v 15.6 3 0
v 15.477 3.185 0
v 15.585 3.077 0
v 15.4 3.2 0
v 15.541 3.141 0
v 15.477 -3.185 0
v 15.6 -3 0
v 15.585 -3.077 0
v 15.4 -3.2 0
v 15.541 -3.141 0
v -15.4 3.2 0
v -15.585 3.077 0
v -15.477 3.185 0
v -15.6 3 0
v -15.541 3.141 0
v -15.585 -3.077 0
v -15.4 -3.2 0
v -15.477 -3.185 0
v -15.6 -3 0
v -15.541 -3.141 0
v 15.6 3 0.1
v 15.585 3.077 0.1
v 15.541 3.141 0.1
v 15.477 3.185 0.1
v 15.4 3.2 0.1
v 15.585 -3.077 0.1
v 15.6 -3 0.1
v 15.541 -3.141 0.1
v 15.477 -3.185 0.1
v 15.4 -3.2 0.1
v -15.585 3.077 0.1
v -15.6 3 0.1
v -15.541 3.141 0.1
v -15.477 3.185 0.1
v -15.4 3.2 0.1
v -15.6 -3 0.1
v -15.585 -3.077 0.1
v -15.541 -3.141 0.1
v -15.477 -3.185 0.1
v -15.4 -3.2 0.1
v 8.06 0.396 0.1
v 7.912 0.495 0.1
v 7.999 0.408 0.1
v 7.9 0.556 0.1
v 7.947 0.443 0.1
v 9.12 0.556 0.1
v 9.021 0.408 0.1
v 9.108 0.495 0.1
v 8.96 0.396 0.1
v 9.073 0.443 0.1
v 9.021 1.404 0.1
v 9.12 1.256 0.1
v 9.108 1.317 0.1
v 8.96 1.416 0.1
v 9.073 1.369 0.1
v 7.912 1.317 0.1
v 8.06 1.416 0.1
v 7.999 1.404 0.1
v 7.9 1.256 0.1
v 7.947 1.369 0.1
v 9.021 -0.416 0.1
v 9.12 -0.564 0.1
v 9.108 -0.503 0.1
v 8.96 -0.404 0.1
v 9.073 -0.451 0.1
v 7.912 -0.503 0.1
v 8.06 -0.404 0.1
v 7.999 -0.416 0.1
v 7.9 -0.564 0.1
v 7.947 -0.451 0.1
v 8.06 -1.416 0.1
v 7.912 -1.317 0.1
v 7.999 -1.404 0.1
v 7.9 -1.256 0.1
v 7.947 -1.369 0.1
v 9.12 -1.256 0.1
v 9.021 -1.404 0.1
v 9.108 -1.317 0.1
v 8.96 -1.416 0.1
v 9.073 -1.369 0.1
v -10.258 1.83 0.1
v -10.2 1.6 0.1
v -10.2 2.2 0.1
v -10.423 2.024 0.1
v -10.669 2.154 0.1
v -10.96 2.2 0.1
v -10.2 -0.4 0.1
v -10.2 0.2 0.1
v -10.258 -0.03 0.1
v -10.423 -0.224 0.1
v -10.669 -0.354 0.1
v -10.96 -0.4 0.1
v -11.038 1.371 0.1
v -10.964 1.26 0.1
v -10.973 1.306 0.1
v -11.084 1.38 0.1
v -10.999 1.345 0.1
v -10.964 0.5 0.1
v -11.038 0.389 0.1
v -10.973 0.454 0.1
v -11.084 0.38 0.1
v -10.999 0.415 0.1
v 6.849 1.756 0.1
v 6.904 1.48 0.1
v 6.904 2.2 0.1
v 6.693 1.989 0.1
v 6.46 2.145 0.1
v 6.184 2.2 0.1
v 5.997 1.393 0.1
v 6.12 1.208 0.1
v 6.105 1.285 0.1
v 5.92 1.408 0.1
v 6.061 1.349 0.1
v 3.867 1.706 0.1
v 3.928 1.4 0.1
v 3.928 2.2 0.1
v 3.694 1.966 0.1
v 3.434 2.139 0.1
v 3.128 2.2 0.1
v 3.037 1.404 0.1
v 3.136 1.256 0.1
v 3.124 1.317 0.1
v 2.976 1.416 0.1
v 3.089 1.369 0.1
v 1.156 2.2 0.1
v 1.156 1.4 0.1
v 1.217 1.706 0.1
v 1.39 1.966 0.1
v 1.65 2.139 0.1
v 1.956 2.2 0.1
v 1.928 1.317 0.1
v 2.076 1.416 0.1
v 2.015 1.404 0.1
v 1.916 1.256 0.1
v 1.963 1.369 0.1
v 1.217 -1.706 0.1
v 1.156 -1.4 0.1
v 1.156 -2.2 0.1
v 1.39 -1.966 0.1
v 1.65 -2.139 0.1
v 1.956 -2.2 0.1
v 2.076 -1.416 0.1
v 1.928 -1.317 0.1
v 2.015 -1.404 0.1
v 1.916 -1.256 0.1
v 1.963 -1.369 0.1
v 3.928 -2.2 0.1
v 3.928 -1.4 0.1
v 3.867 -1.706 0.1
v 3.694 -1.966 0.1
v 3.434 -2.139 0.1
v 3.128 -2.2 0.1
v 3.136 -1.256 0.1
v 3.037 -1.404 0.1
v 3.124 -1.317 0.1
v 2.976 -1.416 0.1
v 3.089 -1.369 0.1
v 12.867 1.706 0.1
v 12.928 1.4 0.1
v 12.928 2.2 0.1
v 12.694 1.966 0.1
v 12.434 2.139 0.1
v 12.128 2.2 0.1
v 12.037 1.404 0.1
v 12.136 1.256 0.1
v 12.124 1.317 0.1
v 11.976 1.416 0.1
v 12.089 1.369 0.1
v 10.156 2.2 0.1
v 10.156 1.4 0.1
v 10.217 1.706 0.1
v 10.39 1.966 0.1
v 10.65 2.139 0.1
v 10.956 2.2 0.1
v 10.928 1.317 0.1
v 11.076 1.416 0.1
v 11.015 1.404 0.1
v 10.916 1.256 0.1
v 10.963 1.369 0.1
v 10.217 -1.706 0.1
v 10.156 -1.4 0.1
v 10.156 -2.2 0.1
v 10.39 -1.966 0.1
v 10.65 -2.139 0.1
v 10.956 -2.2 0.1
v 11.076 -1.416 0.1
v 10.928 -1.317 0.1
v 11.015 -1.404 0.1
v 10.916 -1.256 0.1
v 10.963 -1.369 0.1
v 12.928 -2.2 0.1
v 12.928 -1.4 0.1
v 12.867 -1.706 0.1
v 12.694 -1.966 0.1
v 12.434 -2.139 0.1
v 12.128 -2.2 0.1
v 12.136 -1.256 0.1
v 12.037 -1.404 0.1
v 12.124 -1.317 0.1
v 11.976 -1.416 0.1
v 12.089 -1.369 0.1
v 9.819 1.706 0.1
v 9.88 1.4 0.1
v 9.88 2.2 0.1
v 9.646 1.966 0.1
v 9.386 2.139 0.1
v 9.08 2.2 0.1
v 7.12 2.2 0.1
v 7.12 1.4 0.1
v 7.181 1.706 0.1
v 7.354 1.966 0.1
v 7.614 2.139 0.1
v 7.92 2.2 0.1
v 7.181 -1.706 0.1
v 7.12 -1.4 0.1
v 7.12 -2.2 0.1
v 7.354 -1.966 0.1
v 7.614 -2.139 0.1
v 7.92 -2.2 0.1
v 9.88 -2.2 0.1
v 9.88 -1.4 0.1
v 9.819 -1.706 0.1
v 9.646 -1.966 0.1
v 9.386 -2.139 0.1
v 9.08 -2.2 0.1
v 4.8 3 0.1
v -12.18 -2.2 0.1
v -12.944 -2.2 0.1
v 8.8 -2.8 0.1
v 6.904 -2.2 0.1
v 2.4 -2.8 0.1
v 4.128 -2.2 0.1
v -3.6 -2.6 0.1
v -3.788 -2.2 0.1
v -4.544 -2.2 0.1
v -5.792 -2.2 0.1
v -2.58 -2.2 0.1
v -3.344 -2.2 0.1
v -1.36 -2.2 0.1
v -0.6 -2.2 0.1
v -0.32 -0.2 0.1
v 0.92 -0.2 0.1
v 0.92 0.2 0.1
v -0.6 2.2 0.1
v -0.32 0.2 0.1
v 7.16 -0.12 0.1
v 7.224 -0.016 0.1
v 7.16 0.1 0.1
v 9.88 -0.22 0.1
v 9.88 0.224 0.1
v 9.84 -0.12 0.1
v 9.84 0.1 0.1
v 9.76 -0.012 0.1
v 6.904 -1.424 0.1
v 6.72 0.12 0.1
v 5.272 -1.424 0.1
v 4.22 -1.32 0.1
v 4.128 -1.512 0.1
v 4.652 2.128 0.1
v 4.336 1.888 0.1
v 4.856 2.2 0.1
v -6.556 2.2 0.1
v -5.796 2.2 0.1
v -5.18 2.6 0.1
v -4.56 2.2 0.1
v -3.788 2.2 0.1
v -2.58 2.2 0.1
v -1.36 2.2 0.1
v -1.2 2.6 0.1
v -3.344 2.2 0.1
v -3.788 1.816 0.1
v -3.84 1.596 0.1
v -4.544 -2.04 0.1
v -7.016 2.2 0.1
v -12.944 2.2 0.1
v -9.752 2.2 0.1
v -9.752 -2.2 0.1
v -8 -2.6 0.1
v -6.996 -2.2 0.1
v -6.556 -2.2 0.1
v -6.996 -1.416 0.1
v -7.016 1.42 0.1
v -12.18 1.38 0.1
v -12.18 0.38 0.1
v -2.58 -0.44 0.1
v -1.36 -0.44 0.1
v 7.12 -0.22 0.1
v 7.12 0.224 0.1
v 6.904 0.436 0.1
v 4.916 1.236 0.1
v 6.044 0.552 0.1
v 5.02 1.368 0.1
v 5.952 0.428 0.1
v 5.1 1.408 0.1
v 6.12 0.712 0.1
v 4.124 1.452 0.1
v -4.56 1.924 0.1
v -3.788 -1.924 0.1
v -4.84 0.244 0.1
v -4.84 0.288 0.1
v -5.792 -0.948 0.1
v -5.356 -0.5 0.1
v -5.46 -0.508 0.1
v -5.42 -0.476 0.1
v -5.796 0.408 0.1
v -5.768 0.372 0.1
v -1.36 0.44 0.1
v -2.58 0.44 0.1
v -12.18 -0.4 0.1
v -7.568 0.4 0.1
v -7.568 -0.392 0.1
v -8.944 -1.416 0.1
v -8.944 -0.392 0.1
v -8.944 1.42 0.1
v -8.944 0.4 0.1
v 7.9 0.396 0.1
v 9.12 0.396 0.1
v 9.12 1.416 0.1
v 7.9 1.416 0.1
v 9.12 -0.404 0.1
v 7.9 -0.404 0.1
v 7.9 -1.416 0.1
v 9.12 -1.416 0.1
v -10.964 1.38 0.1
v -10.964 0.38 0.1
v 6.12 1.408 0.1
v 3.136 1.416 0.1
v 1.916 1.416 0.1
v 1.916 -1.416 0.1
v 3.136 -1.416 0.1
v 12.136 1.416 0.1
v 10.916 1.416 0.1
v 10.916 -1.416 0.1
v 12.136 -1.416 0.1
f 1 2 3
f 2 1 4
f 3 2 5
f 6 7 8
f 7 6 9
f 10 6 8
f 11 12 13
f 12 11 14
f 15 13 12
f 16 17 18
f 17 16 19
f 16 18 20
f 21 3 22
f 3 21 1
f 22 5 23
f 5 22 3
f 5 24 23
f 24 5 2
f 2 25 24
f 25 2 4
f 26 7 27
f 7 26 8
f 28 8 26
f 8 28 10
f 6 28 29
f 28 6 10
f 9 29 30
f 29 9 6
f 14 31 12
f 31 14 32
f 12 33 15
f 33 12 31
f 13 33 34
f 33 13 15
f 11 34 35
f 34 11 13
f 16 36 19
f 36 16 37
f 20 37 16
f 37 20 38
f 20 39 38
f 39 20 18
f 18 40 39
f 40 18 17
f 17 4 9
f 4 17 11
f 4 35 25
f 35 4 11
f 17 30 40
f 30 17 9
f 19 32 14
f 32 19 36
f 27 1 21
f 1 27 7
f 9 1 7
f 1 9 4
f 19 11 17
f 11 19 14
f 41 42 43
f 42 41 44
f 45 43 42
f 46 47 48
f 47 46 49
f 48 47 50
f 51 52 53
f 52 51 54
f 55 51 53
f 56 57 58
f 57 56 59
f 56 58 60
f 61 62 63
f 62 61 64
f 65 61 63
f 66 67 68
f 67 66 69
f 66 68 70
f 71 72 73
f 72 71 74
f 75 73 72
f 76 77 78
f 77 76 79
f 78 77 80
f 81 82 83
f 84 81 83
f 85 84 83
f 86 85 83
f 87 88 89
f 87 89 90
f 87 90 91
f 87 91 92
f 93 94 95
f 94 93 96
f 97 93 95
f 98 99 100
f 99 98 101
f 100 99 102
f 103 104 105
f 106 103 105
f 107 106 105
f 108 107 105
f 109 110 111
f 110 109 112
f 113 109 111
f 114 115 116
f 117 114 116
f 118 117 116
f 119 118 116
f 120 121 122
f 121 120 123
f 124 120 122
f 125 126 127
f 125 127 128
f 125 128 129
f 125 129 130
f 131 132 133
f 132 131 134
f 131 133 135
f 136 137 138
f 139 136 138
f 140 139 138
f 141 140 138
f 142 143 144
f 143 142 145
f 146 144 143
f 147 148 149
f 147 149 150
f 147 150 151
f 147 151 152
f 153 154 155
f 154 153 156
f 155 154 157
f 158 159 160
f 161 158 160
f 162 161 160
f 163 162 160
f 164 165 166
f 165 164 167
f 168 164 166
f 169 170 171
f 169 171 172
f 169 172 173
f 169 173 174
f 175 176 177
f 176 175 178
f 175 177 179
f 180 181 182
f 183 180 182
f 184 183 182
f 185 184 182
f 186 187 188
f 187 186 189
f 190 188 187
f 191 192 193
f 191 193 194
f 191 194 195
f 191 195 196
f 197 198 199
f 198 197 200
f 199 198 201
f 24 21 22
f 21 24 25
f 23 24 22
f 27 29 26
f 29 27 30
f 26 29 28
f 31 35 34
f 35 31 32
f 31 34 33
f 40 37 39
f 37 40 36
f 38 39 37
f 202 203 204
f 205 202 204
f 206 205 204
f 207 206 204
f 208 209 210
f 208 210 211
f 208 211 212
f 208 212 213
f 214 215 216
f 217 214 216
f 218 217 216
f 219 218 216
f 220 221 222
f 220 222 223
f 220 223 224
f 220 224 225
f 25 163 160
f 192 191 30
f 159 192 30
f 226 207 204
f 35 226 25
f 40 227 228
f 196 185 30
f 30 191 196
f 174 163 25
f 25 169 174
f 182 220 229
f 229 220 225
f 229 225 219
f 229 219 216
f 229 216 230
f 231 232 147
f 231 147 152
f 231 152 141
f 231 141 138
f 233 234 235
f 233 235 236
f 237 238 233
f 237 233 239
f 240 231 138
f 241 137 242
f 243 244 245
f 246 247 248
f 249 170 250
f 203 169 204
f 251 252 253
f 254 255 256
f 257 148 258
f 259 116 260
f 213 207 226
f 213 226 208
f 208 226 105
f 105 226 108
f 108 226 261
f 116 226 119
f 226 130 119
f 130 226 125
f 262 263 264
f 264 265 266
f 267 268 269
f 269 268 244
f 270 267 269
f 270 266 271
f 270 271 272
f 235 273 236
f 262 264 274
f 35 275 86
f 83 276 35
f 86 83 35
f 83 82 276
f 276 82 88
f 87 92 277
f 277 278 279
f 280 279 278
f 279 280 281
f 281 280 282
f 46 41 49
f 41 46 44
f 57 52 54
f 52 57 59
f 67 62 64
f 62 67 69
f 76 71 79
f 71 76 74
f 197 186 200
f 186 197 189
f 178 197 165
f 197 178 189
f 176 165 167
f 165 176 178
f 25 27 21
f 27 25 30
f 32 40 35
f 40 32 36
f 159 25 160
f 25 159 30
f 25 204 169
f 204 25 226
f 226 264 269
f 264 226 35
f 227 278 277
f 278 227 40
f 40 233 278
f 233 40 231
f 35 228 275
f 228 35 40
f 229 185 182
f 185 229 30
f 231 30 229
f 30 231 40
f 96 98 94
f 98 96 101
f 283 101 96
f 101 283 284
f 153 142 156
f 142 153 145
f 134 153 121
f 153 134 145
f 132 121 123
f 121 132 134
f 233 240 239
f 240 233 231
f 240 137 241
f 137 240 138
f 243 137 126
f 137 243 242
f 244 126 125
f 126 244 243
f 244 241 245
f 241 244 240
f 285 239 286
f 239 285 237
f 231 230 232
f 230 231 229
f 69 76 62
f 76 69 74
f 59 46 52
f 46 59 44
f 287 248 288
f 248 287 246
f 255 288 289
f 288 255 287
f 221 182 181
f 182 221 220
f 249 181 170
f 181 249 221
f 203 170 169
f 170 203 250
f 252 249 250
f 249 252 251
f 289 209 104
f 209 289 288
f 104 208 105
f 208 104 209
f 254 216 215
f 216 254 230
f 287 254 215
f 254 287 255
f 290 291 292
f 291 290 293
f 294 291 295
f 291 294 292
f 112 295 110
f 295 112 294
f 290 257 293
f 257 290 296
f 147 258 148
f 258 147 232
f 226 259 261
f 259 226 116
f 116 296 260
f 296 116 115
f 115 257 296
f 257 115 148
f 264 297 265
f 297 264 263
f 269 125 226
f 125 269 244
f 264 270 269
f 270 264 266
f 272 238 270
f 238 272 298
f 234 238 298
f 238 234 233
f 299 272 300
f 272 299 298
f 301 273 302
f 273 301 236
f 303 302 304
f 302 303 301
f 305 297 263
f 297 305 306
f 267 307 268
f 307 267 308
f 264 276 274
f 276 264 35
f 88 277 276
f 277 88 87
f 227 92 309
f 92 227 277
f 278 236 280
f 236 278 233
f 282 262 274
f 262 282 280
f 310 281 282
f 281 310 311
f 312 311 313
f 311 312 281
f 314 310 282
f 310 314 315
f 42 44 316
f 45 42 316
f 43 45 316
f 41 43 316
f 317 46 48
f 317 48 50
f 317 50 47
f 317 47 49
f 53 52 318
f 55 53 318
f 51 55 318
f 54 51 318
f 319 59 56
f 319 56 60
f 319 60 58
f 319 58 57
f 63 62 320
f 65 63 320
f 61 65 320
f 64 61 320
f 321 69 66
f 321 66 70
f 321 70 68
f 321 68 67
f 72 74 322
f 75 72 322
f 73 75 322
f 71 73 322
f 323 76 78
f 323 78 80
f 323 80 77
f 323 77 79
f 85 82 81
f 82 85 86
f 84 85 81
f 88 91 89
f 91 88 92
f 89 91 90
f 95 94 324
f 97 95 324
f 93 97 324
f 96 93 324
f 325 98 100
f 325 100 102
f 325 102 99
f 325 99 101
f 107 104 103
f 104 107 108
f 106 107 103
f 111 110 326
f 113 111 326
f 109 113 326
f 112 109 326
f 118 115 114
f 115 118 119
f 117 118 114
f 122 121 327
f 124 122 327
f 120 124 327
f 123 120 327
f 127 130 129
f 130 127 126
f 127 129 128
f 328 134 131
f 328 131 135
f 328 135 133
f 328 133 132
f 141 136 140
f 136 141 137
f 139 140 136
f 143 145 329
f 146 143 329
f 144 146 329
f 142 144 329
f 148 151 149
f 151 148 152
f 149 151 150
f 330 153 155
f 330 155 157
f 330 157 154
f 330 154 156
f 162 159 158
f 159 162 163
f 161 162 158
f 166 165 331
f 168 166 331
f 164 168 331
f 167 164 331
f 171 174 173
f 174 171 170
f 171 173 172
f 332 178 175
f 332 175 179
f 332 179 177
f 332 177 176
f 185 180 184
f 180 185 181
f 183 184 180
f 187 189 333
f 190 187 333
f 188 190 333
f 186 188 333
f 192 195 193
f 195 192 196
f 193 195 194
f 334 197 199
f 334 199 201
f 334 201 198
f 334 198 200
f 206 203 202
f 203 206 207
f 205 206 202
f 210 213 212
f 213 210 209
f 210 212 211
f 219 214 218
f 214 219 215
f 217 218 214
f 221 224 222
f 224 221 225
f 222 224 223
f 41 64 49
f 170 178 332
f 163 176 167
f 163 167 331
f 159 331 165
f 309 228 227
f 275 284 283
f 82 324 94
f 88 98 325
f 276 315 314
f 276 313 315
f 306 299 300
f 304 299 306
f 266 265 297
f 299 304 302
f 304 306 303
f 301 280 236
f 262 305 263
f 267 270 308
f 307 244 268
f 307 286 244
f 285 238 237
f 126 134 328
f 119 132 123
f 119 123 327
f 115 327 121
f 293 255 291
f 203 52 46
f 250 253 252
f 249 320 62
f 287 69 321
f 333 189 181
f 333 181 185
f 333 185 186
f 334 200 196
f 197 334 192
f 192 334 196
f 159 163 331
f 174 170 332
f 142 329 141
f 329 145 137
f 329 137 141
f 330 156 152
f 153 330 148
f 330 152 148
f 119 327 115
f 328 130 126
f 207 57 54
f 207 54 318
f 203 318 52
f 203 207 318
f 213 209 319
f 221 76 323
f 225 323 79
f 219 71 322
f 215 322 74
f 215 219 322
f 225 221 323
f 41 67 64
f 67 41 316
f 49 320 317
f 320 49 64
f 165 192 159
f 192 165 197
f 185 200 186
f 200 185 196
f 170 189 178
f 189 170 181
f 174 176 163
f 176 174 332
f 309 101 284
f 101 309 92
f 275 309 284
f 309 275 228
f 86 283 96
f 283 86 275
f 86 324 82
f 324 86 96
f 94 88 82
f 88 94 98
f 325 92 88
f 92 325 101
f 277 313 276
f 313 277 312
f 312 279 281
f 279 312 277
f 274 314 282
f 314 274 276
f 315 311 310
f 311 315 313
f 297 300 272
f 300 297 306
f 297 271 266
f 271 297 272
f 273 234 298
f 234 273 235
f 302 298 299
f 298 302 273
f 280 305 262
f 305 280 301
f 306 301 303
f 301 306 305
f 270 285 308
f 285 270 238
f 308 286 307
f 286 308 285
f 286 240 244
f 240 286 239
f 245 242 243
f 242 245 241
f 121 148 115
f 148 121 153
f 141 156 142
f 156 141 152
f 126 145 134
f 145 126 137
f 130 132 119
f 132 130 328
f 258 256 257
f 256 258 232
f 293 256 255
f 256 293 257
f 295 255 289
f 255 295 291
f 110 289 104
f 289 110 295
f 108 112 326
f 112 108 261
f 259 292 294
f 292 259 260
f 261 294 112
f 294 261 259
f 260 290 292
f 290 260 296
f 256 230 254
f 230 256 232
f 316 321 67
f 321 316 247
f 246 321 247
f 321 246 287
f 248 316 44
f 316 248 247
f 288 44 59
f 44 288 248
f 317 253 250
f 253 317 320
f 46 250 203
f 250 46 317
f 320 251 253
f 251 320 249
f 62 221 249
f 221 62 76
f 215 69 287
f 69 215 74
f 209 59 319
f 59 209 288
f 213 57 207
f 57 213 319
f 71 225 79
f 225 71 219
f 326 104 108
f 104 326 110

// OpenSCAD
// file: ../p/1-4ndis.scad
use <../lib.scad>
function ldraw_lib__1_4ndis() = [
// 0 Disc Negative 0.25
// 0 Name: 1-4ndis.dat
// 0 Author: James Jessiman
// 0 !LDRAW_ORG Primitive UPDATE 2012-01
// 0 !LICENSE Licensed under CC BY 2.0 and CC BY 4.0 : see CAreadme.txt
// 
// 0 BFC CERTIFY CCW
  [0,"BFC","CERTIFY"],
  [0,"BFC","CCW"],
// 
// 0 !HISTORY 2002-03-23 [sbliss] Added BFC Statement
// 0 !HISTORY 2002-04-25 [PTadmin] Official Update 2002-02
// 0 !HISTORY 2007-06-22 [PTadmin] Header formatted for Contributor Agreement
// 0 !HISTORY 2008-07-01 [PTadmin] Official Update 2008-01
// 0 !HISTORY 2012-02-16 [Philo] Changed to CCW
// 0 !HISTORY 2012-03-30 [PTadmin] Official Update 2012-01
// 
// 
// 3 16 0.9239 0 0.3827 1 0 0 1 0 1
  [3,16,0.9239,0,0.3827,1,0,0,1,0,1],
// 3 16 0.7071 0 0.7071 0.9239 0 0.3827 1 0 1
  [3,16,0.7071,0,0.7071,0.9239,0,0.3827,1,0,1],
// 3 16 0.3827 0 0.9239 0.7071 0 0.7071 1 0 1
  [3,16,0.3827,0,0.9239,0.7071,0,0.7071,1,0,1],
// 3 16 0 0 1 0.3827 0 0.9239 1 0 1
  [3,16,0,0,1,0.3827,0,0.9239,1,0,1],
];
makepoly(ldraw_lib__1_4ndis(), line=0.2);
// file: ../p/box3u12.scad
use <../lib.scad>
function ldraw_lib__box3u12() = [
// 0 Box with 3 Parallel Faces without Any Edges
// 0 Name: box3u12.dat
// 0 Author: J.C. Tchang [tchang]
// 0 !LDRAW_ORG Primitive UPDATE 2014-02
// 0 !LICENSE Licensed under CC BY 2.0 and CC BY 4.0 : see CAreadme.txt
// 
// 0 BFC CERTIFY CCW
  [0,"BFC","CERTIFY"],
  [0,"BFC","CCW"],
// 
// 0 !HISTORY 2014-12-23 [PTadmin] Official Update 2014-02
// 
// 
// 4 16 -1 1 1 1 1 1 1 1 -1 -1 1 -1
  [4,16,-1,1,1,1,1,1,1,1,-1,-1,1,-1],
// 4 16 -1 1 1 -1 0 1 1 0 1 1 1 1
  [4,16,-1,1,1,-1,0,1,1,0,1,1,1,1],
// 4 16 1 1 -1 1 0 -1 -1 0 -1 -1 1 -1
  [4,16,1,1,-1,1,0,-1,-1,0,-1,-1,1,-1],
];
makepoly(ldraw_lib__box3u12(), line=0.2);
// file: ../p/1-4cyli.scad
use <../lib.scad>
function ldraw_lib__1_4cyli() = [
// 0 Cylinder 0.25
// 0 Name: 1-4cyli.dat
// 0 Author: James Jessiman
// 0 !LDRAW_ORG Primitive UPDATE 2012-01
// 0 !LICENSE Licensed under CC BY 2.0 and CC BY 4.0 : see CAreadme.txt
// 
// 0 BFC CERTIFY CCW
  [0,"BFC","CERTIFY"],
  [0,"BFC","CCW"],
// 
// 0 !HISTORY 2002-03-23 [sbliss] Added BFC statement.
// 0 !HISTORY 2002-04-25 [PTadmin] Official Update 2002-02
// 0 !HISTORY 2007-06-22 [PTadmin] Header formatted for Contributor Agreement
// 0 !HISTORY 2008-07-01 [PTadmin] Official Update 2008-01
// 0 !HISTORY 2012-02-16 [Philo] Changed to CCW
// 0 !HISTORY 2012-03-30 [PTadmin] Official Update 2012-01
// 
// 
// 4 16 1 1 0 0.9239 1 0.3827 0.9239 0 0.3827 1 0 0
  [4,16,1,1,0,0.9239,1,0.3827,0.9239,0,0.3827,1,0,0],
// 5 24 1 0 0 1 1 0 0.9239 0 0.3827 1 0 -1
  [5,24,1,0,0,1,1,0,0.9239,0,0.3827,1,0,-1],
// 4 16 0.9239 1 0.3827 0.7071 1 0.7071 0.7071 0 0.7071 0.9239 0 0.3827
  [4,16,0.9239,1,0.3827,0.7071,1,0.7071,0.7071,0,0.7071,0.9239,0,0.3827],
// 5 24 0.9239 0 0.3827 0.9239 1 0.3827 0.7071 0 0.7071 1 0 0
  [5,24,0.9239,0,0.3827,0.9239,1,0.3827,0.7071,0,0.7071,1,0,0],
// 4 16 0.7071 1 0.7071 0.3827 1 0.9239 0.3827 0 0.9239 0.7071 0 0.7071
  [4,16,0.7071,1,0.7071,0.3827,1,0.9239,0.3827,0,0.9239,0.7071,0,0.7071],
// 5 24 0.7071 0 0.7071 0.7071 1 0.7071 0.3827 0 0.9239 0.9239 0 0.3827
  [5,24,0.7071,0,0.7071,0.7071,1,0.7071,0.3827,0,0.9239,0.9239,0,0.3827],
// 4 16 0.3827 1 0.9239 0 1 1 0 0 1 0.3827 0 0.9239
  [4,16,0.3827,1,0.9239,0,1,1,0,0,1,0.3827,0,0.9239],
// 5 24 0.3827 0 0.9239 0.3827 1 0.9239 0 0 1 0.7071 0 0.7071
  [5,24,0.3827,0,0.9239,0.3827,1,0.9239,0,0,1,0.7071,0,0.7071],
// 5 24 0 0 1 0 1 1 0.3827 0 0.9239 -1 0 1
  [5,24,0,0,1,0,1,1,0.3827,0,0.9239,-1,0,1],
];
makepoly(ldraw_lib__1_4cyli(), line=0.2);
// file: ../p/1-4chrd.scad
use <../lib.scad>
function ldraw_lib__1_4chrd() = [
// 0 Chord 0.25
// 0 Name: 1-4chrd.dat
// 0 Author: Tony Hafner [hafhead]
// 0 !LDRAW_ORG Primitive UPDATE 2012-02
// 0 !LICENSE Licensed under CC BY 2.0 and CC BY 4.0 : see CAreadme.txt
// 
// 0 BFC CERTIFY CCW
  [0,"BFC","CERTIFY"],
  [0,"BFC","CCW"],
// 
// 0 !HISTORY 2004-04-22 [PTadmin] Official Update 2004-02
// 0 !HISTORY 2007-10-09 [PTadmin] Header formatted for Contributor Agreement
// 0 !HISTORY 2008-07-01 [PTadmin] Official Update 2008-01
// 0 !HISTORY 2012-08-02 [MMR1988] Re-creation with PrimGen2 and Rectifier
// 0 !HISTORY 2012-08-09 [PTadmin] Official Update 2012-02
// 
// 
// 4 16 0.9239 0 0.3827 0.3827 0 0.9239 0 0 1 1 0 0
  [4,16,0.9239,0,0.3827,0.3827,0,0.9239,0,0,1,1,0,0],
// 3 16 0.7071 0 0.7071 0.3827 0 0.9239 0.9239 0 0.3827
  [3,16,0.7071,0,0.7071,0.3827,0,0.9239,0.9239,0,0.3827],
];
makepoly(ldraw_lib__1_4chrd(), line=0.2);
// main file
use <../lib.scad>
use <../p/1-4chrd.scad>
use <../p/1-4cyli.scad>
use <../p/box3u12.scad>
use <s/6258203js01.scad>
function ldraw_lib__6258203j() = [
// 0 Sticker  0.8 x  3.9 with White License Plate "PEKH-0280"
// 0 Name: 6258203j.dat
// 0 Author: Ulrich Röder [UR]
// 0 !LDRAW_ORG Part UPDATE 2019-01
// 0 !LICENSE Licensed under CC BY 2.0 and CC BY 4.0 : see CAreadme.txt
// 
// 0 BFC CERTIFY CCW
  [0,"BFC","CERTIFY"],
  [0,"BFC","CCW"],
// 
// 0 !KEYWORDS Ford, Mustang, Set 10265
// 
// 0 !HISTORY 2019-06-28 [PTadmin] Official Update 2019-01
// 
// 
// 0 // Font: Registration Plate UK
// 
// 0 // Main
// 0 // Box Rounded
// 
// 1 16 38.5 0 7.5 .5 0 0 0 -1 0 0 0 .5 1-4chrd.dat
  [1,16,38.5,0,7.5,.5,0,0,0,-1,0,0,0,.5, ldraw_lib__1_4chrd()],
// 1 16 38.5 0 -7.5 .5 0 0 0 -1 0 0 0 -.5 1-4chrd.dat
  [1,16,38.5,0,-7.5,.5,0,0,0,-1,0,0,0,-.5, ldraw_lib__1_4chrd()],
// 1 16 -38.5 0 7.5 -.5 0 0 0 -1 0 0 0 .5 1-4chrd.dat
  [1,16,-38.5,0,7.5,-.5,0,0,0,-1,0,0,0,.5, ldraw_lib__1_4chrd()],
// 1 16 -38.5 0 -7.5 -.5 0 0 0 -1 0 0 0 -.5 1-4chrd.dat
  [1,16,-38.5,0,-7.5,-.5,0,0,0,-1,0,0,0,-.5, ldraw_lib__1_4chrd()],
// 1 16 38.5 0 7.5 .5 0 0 0 -.25 0 0 0 .5 1-4cyli.dat
  [1,16,38.5,0,7.5,.5,0,0,0,-.25,0,0,0,.5, ldraw_lib__1_4cyli()],
// 1 16 38.5 0 -7.5 .5 0 0 0 -.25 0 0 0 -.5 1-4cyli.dat
  [1,16,38.5,0,-7.5,.5,0,0,0,-.25,0,0,0,-.5, ldraw_lib__1_4cyli()],
// 1 16 -38.5 0 7.5 -.5 0 0 0 -.25 0 0 0 .5 1-4cyli.dat
  [1,16,-38.5,0,7.5,-.5,0,0,0,-.25,0,0,0,.5, ldraw_lib__1_4cyli()],
// 1 16 -38.5 0 -7.5 -.5 0 0 0 -.25 0 0 0 -.5 1-4cyli.dat
  [1,16,-38.5,0,-7.5,-.5,0,0,0,-.25,0,0,0,-.5, ldraw_lib__1_4cyli()],
// 1 16 0 -.25 0 38.5 0 0 0 .25 0 0 0 8 box3u12.dat
  [1,16,0,-.25,0,38.5,0,0,0,.25,0,0,0,8, ldraw_lib__box3u12()],
// 4 16 -39 -.25 -7.5 -39 -.25 7.5 -39 0 7.5 -39 0 -7.5
  [4,16,-39,-.25,-7.5,-39,-.25,7.5,-39,0,7.5,-39,0,-7.5],
// 4 16 39 0 7.5 39 -.25 7.5 39 -.25 -7.5 39 0 -7.5
  [4,16,39,0,7.5,39,-.25,7.5,39,-.25,-7.5,39,0,-7.5],
// 4 16 39 0 7.5 39 0 -7.5 38.5 0 -8 38.5 0 8
  [4,16,39,0,7.5,39,0,-7.5,38.5,0,-8,38.5,0,8],
// 4 16 -39 0 7.5 -38.5 0 8 -38.5 0 -8 -39 0 -7.5
  [4,16,-39,0,7.5,-38.5,0,8,-38.5,0,-8,-39,0,-7.5],
// 
// 0 // White
// 1 15 0 0 0 1 0 0 0 1 0 0 0 1 s\6258203js01.dat
  [1,15,0,0,0,1,0,0,0,1,0,0,0,1, ldraw_lib__s__6258203js01()],
];
makepoly(ldraw_lib__6258203j(), line=0.2);
